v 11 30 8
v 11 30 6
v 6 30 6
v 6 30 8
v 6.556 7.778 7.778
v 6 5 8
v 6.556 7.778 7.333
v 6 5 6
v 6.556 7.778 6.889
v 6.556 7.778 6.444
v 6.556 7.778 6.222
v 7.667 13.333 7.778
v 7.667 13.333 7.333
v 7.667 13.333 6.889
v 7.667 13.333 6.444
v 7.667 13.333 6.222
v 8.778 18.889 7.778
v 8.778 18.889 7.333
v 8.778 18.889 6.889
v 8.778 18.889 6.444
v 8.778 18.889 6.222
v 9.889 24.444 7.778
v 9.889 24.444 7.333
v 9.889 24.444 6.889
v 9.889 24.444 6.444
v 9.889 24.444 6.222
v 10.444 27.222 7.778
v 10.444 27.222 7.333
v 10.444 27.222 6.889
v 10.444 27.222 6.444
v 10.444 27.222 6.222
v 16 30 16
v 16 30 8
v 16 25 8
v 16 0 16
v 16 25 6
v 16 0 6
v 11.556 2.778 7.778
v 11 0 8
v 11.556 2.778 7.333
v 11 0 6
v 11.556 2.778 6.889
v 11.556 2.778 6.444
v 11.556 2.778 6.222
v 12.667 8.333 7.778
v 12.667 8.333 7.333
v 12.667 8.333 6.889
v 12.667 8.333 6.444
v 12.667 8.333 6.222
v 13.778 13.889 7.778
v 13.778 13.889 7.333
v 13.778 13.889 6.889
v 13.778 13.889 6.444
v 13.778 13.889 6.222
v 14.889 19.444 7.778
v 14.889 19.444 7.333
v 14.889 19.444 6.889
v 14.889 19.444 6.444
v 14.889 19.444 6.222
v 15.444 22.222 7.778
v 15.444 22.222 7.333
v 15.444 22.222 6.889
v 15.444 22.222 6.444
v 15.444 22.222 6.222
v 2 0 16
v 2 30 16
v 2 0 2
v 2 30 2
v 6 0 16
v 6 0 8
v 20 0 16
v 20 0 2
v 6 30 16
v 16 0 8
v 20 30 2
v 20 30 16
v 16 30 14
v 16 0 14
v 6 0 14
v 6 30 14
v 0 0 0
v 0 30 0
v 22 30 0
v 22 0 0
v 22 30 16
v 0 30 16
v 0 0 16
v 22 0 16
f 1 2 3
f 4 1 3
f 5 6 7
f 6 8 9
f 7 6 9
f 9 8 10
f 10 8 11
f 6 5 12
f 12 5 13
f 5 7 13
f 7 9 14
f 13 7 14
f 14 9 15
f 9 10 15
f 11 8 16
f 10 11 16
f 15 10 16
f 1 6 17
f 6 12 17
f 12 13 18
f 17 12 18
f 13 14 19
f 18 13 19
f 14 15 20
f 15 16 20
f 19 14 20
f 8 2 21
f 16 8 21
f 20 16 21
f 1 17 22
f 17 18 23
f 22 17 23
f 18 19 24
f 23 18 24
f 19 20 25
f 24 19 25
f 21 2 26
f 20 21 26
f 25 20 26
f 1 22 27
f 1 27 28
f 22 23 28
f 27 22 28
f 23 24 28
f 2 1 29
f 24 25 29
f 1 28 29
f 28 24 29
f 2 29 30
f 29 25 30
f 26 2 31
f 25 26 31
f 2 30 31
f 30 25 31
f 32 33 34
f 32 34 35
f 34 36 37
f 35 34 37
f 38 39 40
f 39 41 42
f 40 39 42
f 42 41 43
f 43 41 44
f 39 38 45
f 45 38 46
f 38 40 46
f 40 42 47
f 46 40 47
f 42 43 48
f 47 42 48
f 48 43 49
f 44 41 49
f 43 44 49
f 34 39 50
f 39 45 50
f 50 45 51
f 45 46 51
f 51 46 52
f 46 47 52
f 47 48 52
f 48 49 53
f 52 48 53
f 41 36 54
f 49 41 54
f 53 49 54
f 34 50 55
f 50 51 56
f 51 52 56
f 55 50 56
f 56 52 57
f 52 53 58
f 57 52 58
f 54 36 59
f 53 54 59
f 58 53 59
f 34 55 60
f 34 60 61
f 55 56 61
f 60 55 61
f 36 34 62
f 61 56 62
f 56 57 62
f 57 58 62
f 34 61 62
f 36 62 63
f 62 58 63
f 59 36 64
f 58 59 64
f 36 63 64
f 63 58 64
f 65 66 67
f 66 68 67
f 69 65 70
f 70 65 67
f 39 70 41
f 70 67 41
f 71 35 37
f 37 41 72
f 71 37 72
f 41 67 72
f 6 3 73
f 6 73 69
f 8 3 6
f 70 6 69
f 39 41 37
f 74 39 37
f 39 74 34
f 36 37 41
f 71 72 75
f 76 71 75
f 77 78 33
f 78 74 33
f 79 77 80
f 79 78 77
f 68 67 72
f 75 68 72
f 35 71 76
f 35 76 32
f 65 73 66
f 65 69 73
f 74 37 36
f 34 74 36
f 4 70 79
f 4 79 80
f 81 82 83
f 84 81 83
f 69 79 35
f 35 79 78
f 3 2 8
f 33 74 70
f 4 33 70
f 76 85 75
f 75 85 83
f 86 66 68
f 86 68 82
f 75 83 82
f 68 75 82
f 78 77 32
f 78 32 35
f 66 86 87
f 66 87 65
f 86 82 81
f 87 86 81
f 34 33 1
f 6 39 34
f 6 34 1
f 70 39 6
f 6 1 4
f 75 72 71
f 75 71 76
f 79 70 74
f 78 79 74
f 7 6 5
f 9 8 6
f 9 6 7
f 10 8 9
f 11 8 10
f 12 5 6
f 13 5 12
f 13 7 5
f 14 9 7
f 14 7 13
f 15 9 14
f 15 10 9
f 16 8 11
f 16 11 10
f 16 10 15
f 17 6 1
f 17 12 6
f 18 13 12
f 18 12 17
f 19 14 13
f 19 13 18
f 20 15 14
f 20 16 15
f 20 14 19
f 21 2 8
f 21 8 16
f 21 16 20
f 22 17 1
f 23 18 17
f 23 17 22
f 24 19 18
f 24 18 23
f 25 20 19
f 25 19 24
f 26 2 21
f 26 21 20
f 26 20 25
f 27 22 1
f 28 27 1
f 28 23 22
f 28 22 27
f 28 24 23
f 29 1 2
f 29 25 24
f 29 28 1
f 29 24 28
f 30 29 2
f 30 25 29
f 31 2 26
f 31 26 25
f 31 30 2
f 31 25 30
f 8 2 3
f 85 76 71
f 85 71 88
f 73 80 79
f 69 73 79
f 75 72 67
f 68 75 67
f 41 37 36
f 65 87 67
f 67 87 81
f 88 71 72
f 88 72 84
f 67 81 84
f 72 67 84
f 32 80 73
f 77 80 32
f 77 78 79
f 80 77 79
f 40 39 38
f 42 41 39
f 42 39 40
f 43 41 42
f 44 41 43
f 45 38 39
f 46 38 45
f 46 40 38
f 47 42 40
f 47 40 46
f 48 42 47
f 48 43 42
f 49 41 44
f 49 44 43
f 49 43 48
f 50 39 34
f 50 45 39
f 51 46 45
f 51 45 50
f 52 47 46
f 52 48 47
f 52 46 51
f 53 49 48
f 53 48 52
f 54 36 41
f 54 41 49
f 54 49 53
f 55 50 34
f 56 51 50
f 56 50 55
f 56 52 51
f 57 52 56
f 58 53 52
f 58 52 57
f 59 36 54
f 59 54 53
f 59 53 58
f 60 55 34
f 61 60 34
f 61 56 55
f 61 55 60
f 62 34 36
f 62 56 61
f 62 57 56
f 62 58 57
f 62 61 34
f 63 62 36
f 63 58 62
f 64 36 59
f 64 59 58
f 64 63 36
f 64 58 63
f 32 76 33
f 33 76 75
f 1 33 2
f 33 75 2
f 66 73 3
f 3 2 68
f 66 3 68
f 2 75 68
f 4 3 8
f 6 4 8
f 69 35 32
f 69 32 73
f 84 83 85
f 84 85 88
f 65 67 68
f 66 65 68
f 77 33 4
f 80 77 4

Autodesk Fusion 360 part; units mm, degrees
sketch "Esquisse1" plane through (0, 0, 0) normal (1, 0, 0) x (0, 1, 0)
sketch "Esquisse2" plane through (0, 0, 0) normal (0, 0, 1) x (1, 0, 0)
  line L0 (0, 0) -> (22, 0)
  line L1 (22, 0) -> (22, 30)
  line L2 (22, 30) -> (0, 30)
  line L3 (0, 30) -> (0, 0)
  dimension "d10" = 22
  dimension "d11" = 30
sketch "Esquisse3" plane through (0, 0, 0) normal (0, 0, 1) x (1, 0, 0)
  line L0 (0, 0) -> (2, 0)
  line L1 (2, 0) -> (2, 30)
  line L2 (2, 30) -> (0, 30)
  line L3 (0, 30) -> (0, 0)
  dimension "d12" = 2
  dimension "d13" = 30
sketch "Esquisse4" plane through (0, 0, 0) normal (0, 0, 1) x (1, 0, 0)
  line L0 (22, 0) -> (20, 0)
  line L1 (20, 0) -> (20, 30)
  line L2 (20, 30) -> (22, 30)
  line L3 (22, 30) -> (22, 0)
  dimension "d14" = 2
  dimension "d15" = 30
sketch "Esquisse1 (2)" plane through (0, 0, 0) normal (0, 0, 1) x (1, 0, 0) in component "shield"
extrude "Extrusion1" add sketch "Esquisse3" along normal blind 16 makes body 1 in component "shield"
extrude "Extrusion2" add sketch "Esquisse4" along normal blind 16 separate body makes body 2 in component "shield"
extrude "Extrusion3" add sketch "Esquisse2" along normal blind 2 bodies 1 2 in component "shield"
sketch "Esquisse2 (2)" plane through (0, 0, 2) normal (0, 0, 1) x (-1, 0, 0) in component "shield"
  line L0 (-2, -30) -> (-2, 0)
  line L1 (-2, 0) -> (-20, 0)
  line L2 (-20, 0) -> (-20, -30)
  line L3 (-20, -30) -> (-2, -30)
  line L4 (-2, -30) -> (-6, -30)
  line L5 (-6, -30) -> (-6, 0)
  line L6 (-6, 0) -> (-2, 0)
  line L7 (-2, 0) -> (-2, -30)
  line L8 (-20, -30) -> (-16, -30)
  line L9 (-16, -30) -> (-16, 0)
  line L10 (-16, 0) -> (-20, 0)
  line L11 (-20, 0) -> (-20, -30)
  dimension "d22" = 4
  dimension "d23" = 30
  dimension "d24" = 4
  dimension "d25" = 30
extrude "Extrusion1'" add sketch "Esquisse2 (2)" along normal blind 14 separate body contours L0 L1 L3 L4 L5 L6 L7 | L1 L2 L3 L8 L9 L10 L11 makes body 3 at (6, 20, 6.6667) makes body 4 at (20, 10, 6.6667) in component "Support"
sketch "Esquisse1 (3)" plane through (0, 0, 2) normal (0, 0, 1) x (-1, 0, 0) in component "Support"
  line L0 (-2, -30) -> (-2, 0)
  line L1 (-2, 0) -> (-20, 0)
  line L2 (-20, 0) -> (-20, -30)
  line L3 (-20, -30) -> (-2, -30)
  line L4 (-16, -30) -> (-6, -30)
  line L5 (-6, -30) -> (-6, 0)
  line L6 (-6, 0) -> (-16, 0)
  line L7 (-16, 0) -> (-16, -30)
  dimension "d28" = 10
  dimension "d29" = 30
extrude "Extrusion2'" add sketch "Esquisse1 (3)" along normal blind 4 contours L1 L3 L4 L5 L6 L7 bodies 3 4 in component "Support"
sketch "Esquisse1 (4)" plane through (0, 0, 6) normal (0, 0, 1) x (-1, 0, 0) in component "trianglee_1"
  line L0 (-16, 0) -> (-16, -30)
  line L1 (-16, -30) -> (-6, -30)
  line L2 (-6, -30) -> (-6, 0)
  line L3 (-6, 0) -> (-16, 0)
  spline S0 degree 5 poles (-11, 0) (-11.2, -1) (-11.6, -3) (-12.2, -6) (-13, -10) (-14, -15) (-14.8, -19) (-15.4, -22) (-15.8, -24) (-16, -25) knots 0 0 0 0 0 0 0.2 0.4 0.6 0.8 1 1 1 1 1 1
  dimension "d32" = 5
  dimension "d33" = 5
extrude "Extrusion1''" add sketch "Esquisse1 (4)" along normal blind 2 separate body contours L0 L3 S0 makes body 5 in component "trianglee_1"
sketch "Esquisse1 (5)" plane through (0, 0, 6) normal (0, 0, 1) x (-1, 0, 0) in component "triangle_2"
  line L0 (-16, 0) -> (-16, -30)
  line L1 (-16, -30) -> (-6, -30)
  line L2 (-6, -30) -> (-6, 0)
  line L3 (-6, 0) -> (-16, 0)
  spline S0 degree 5 poles (-6, -5) (-6.2, -6) (-6.6, -8) (-7.2, -11) (-8, -15) (-9, -20) (-9.8, -24) (-10.4, -27) (-10.8, -29) (-11, -30) knots 0 0 0 0 0 0 0.2 0.4 0.6 0.8 1 1 1 1 1 1
  dimension "d36" = 5
  dimension "d37" = 5
extrude "Extrusion1'''" add sketch "Esquisse1 (5)" along normal blind 2 separate body contours L1 L2 S0 makes body 6 in component "triangle_2"
extrude "Extrusion3'" add 1 faces at (12.6667, 20, 6) along direction (0, 0, 1) blind 2 on bodies 3 bodies 3 in component "Support"
copy_body "CopierCollerCorps1" bodies 5 makes body 7 in component "Support"
copy_body "CopierCollerCorps2" bodies 6 makes body 8 in component "Support"
combine "Combiner1" operation cut target body 3 tool bodies 7 8 in component "Support"
sketch "Esquisse1 (6)" plane through (0, 0, 8) normal (0, 0, 1) x (-1, 0, 0) in component "Mousse"
  line L0 (-11, -30) -> (-6, -5)
  line L1 (-6, -5) -> (-6, 0)
  line L2 (-6, 0) -> (-11, 0)
  line L3 (-11, 0) -> (-16, -25)
  line L4 (-16, -25) -> (-16, -30)
  line L5 (-16, -30) -> (-11, -30)
  line L6 (-6, -30) -> (-16, -30)
  line L7 (-16, -30) -> (-16, 0)
  line L8 (-16, 0) -> (-6, 0)
  line L9 (-6, 0) -> (-6, -30)
extrude "Extrusion1''''" add sketch "Esquisse1 (6)" along normal blind 6 separate body makes body 9 in component "Mousse"
extrude "Extrusion1'''''" add 1 faces at (12.6667, 11.6667, 14) along direction (0, 0, 1) blind 2 separate body on bodies 9 makes body 10 in component "plateau"
component "shield" placed x (1, 0, 0) y (0, 1, 0) z (0, 0, 1) at (0, 0, 0)
component "Support" placed x (1, 0, 0) y (0, 1, 0) z (0, 0, 1) at (0, 0, 0)
component "trianglee_1" placed x (1, 0, 0) y (0, 1, 0) z (0, 0, 1) at (0, 0, 0)
component "triangle_2" placed x (1, 0, 0) y (0, 1, 0) z (0, 0, 1) at (0, 0, 0)
component "Mousse" placed x (1, 0, 0) y (0, 1, 0) z (0, 0, 1) at (0, 0, 0)
component "plateau" placed x (1, 0, 0) y (0, 1, 0) z (0, 0, 1) at (0, 0, 0)
equation "distance_bord = 4 mm"
equation "epaisseur = 2 mm"
equation "distance_plaques = 5 mm"
equation "Longueur = 30 mm"
equation "largeur_base_triangle = 5 mm"
equation "largeur = 2 * distance_bord + 2 * epaisseur + distance_plaques + largeur_base_triangle"
equation "d10 = largeur"
equation "d11 = Longueur"
equation "d12 = epaisseur"
equation "d13 = Longueur"
equation "d14 = epaisseur"
equation "d15 = Longueur"
equation "d16 = hauteur"
equation "d18 = hauteur"
equation "d20 = epaisseur"
equation "d22 = distance_bord"
equation "d23 = Longueur"
equation "d24 = distance_bord"
equation "d25 = Longueur"
equation "d26 = hauteur - epaisseur"
equation "d28 = distance_plaques + largeur_base_triangle"
equation "d29 = Longueur"
equation "d30 = distance_bord"
equation "d32 = distance_plaques"
equation "d33 = distance_plaques"
equation "d34 = epaisseur"
equation "d36 = distance_plaques"
equation "d37 = distance_plaques"
equation "d38 = epaisseur"
equation "d40 = epaisseur"
equation "d44 = epaisseur"
